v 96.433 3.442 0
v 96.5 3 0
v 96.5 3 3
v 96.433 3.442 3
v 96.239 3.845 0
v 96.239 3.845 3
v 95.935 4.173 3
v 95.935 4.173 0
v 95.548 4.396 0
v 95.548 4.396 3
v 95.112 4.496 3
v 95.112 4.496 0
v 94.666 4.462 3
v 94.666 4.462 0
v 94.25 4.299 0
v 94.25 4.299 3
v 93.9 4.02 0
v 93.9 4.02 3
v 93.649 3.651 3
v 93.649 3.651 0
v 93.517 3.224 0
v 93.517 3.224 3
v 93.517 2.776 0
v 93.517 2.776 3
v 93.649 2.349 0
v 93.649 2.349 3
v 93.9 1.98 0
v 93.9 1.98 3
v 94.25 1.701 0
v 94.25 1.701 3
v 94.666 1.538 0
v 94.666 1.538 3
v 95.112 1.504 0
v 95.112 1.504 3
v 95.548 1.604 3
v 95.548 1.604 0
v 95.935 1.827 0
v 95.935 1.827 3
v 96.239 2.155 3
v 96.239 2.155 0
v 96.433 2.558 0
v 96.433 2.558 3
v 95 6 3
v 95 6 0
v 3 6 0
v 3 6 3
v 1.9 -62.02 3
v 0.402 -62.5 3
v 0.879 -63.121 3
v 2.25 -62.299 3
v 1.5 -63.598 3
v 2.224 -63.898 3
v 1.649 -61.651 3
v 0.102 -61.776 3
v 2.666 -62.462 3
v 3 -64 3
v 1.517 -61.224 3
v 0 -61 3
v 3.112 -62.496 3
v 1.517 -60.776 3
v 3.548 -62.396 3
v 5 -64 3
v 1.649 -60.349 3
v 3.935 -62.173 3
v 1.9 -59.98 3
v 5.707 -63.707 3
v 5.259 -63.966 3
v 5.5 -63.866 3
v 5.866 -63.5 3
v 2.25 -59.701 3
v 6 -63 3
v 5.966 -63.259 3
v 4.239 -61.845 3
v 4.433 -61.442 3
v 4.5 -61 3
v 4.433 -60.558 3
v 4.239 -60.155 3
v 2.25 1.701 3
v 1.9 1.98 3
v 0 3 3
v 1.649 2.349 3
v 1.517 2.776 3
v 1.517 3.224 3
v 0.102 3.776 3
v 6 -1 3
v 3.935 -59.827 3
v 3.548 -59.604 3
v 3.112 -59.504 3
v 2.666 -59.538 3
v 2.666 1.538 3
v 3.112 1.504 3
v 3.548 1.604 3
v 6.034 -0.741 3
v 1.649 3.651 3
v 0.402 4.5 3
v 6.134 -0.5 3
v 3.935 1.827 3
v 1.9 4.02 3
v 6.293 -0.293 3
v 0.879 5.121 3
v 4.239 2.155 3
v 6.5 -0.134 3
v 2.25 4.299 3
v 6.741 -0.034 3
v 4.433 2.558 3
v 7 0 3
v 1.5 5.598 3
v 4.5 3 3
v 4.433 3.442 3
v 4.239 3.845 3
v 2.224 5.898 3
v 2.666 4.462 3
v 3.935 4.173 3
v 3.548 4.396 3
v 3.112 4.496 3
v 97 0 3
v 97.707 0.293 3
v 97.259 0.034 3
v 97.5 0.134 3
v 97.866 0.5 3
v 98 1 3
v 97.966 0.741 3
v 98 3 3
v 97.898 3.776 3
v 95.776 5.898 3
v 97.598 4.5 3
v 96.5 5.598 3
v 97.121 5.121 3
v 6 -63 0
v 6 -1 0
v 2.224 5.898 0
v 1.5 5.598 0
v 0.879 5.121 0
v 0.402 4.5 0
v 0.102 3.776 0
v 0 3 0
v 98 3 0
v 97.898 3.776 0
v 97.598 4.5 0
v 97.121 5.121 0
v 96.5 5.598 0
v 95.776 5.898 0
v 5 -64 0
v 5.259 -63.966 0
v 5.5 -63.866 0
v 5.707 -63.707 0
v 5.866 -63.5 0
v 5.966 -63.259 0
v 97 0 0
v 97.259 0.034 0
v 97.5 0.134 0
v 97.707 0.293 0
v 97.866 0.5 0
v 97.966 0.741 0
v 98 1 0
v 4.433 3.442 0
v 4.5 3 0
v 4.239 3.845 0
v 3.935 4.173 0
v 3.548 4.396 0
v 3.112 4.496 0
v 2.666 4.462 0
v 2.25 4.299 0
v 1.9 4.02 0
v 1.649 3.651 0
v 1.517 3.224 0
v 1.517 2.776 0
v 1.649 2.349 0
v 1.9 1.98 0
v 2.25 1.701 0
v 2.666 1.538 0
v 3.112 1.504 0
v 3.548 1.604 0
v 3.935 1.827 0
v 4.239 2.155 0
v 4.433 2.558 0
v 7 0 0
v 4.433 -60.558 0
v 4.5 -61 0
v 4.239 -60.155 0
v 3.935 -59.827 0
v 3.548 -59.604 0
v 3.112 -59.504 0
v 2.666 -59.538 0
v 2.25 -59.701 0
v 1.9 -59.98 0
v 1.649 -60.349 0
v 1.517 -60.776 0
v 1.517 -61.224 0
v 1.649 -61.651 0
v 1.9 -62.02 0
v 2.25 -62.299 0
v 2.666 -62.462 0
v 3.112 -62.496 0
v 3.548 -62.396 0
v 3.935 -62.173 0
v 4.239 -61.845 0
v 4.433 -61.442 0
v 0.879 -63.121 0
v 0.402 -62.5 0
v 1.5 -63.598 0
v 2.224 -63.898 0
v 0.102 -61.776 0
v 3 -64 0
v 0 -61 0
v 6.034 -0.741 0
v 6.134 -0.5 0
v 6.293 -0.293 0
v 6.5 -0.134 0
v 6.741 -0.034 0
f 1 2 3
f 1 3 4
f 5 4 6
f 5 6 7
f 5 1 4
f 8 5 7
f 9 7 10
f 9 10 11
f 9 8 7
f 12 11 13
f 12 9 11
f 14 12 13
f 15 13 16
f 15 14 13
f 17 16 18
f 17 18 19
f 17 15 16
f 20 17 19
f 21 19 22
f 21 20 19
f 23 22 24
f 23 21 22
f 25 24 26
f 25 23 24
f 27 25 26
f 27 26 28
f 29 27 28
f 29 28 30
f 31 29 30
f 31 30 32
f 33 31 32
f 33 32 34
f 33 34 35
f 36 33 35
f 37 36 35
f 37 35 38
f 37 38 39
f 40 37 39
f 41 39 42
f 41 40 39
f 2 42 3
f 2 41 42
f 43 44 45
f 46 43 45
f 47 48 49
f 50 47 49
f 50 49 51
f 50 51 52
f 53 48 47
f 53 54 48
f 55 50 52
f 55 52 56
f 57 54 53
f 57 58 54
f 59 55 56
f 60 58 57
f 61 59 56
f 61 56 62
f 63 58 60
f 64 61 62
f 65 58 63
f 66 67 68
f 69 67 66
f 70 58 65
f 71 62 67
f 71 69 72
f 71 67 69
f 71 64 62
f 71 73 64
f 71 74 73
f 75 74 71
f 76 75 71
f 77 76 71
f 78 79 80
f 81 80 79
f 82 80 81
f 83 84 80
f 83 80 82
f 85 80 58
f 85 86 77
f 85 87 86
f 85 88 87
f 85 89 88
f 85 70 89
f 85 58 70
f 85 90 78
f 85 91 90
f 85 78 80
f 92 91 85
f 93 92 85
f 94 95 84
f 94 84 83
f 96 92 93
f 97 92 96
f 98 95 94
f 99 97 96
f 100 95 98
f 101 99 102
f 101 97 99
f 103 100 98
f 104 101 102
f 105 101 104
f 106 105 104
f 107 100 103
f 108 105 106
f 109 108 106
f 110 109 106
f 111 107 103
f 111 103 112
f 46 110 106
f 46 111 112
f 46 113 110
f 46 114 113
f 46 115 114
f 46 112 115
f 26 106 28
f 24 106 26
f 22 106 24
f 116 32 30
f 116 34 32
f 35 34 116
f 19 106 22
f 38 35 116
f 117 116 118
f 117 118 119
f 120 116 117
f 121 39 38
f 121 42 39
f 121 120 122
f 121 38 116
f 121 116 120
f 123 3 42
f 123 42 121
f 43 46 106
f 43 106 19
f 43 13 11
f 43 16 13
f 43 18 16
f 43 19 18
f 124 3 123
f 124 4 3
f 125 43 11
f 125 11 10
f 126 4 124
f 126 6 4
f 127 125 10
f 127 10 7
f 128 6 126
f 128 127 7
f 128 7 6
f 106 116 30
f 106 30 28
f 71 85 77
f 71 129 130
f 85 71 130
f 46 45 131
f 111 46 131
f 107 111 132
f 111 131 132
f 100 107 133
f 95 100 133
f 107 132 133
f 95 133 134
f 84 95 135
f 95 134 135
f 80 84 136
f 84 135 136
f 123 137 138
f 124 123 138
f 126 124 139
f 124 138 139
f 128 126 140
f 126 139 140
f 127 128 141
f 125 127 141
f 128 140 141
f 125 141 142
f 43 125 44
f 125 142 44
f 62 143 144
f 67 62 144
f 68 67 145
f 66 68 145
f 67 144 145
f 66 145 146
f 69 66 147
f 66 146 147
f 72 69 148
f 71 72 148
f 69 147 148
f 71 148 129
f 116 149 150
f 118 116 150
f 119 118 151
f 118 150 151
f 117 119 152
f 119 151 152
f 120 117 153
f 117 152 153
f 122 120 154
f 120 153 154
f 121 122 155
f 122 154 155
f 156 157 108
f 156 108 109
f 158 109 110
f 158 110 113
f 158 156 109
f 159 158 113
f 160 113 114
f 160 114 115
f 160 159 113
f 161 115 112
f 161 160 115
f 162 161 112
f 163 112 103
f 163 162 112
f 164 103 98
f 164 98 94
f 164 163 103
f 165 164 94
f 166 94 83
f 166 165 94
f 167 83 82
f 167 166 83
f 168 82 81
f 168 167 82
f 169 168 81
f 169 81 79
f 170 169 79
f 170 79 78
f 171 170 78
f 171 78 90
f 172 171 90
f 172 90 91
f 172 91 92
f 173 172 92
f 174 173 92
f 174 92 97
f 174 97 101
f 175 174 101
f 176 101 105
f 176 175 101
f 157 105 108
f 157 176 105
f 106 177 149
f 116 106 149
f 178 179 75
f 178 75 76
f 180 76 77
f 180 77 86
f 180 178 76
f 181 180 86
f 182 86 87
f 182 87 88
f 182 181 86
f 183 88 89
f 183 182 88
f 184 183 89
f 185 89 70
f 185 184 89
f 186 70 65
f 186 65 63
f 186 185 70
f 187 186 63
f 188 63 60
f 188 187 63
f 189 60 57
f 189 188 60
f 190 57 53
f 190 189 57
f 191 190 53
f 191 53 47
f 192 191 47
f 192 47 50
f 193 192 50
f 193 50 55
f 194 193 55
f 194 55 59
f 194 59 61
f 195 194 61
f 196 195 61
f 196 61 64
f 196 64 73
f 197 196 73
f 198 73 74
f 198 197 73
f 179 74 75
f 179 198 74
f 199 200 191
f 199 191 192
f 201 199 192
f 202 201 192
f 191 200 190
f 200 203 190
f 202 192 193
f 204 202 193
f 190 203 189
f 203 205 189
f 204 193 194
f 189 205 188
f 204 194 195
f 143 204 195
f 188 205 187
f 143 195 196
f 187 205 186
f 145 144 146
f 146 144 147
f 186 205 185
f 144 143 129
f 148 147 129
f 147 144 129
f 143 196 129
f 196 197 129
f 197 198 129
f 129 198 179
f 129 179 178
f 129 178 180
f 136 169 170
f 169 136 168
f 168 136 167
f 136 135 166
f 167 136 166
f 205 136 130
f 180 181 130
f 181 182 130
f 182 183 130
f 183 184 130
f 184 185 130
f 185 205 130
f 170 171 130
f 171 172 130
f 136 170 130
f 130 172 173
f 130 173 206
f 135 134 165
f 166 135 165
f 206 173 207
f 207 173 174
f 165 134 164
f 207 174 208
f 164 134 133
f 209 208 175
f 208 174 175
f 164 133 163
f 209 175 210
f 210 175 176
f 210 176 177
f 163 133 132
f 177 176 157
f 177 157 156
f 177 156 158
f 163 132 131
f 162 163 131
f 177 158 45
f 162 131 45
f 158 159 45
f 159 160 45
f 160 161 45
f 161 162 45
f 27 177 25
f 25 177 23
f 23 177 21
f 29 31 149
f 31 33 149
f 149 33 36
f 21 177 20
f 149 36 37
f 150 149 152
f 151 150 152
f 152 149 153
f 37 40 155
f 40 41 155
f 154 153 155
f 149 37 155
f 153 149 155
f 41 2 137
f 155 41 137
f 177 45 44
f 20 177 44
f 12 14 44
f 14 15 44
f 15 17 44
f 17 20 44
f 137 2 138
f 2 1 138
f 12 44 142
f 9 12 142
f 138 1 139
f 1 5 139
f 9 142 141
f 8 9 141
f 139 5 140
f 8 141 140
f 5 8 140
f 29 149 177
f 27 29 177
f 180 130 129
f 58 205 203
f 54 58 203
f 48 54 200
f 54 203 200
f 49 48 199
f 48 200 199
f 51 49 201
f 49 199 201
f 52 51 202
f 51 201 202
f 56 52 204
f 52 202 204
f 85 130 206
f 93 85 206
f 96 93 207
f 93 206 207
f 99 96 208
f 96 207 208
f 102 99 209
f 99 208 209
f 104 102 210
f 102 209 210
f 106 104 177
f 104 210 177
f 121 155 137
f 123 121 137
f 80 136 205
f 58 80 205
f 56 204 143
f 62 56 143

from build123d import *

# Parameters (mm, degrees)
F0_R     = 1.5
F1_DEPTH = 3


with BuildPart() as f1:
    # F0 (on Top) → F1 (new body)
    with BuildSketch(Plane.XY):
        with BuildLine():
            ThreePointArc((6, -1), (6.292893, -0.292893), (7, 0))
            Line((7, 0), (97, 0))
            ThreePointArc((97, 0), (97.707107, 0.292893), (98, 1))
            Line((98, 1), (98, 3))
            ThreePointArc((98, 3), (97.12132, 5.12132), (95, 6))
            Line((95, 6), (3, 6))
            ThreePointArc((3, 6), (0.87868, 5.12132), (0, 3))
            Line((0, 3), (0, 1))
            Line((0, 1), (0, 0))
            Line((0, 0), (0, -61))
            ThreePointArc((0, -61), (0.87868, -63.12132), (3, -64))
            Line((3, -64), (5, -64))
            ThreePointArc((5, -64), (5.707107, -63.707107), (6, -63))
            Line((6, -63), (6, -1))
        make_face()
        with Locations((3, -61)):
            Circle(F0_R, mode=Mode.SUBTRACT)
        with Locations((3, 3)):
            Circle(F0_R, mode=Mode.SUBTRACT)
        with Locations((95, 3)):
            Circle(F0_R, mode=Mode.SUBTRACT)
    extrude(amount=F1_DEPTH)


solid = f1.part
